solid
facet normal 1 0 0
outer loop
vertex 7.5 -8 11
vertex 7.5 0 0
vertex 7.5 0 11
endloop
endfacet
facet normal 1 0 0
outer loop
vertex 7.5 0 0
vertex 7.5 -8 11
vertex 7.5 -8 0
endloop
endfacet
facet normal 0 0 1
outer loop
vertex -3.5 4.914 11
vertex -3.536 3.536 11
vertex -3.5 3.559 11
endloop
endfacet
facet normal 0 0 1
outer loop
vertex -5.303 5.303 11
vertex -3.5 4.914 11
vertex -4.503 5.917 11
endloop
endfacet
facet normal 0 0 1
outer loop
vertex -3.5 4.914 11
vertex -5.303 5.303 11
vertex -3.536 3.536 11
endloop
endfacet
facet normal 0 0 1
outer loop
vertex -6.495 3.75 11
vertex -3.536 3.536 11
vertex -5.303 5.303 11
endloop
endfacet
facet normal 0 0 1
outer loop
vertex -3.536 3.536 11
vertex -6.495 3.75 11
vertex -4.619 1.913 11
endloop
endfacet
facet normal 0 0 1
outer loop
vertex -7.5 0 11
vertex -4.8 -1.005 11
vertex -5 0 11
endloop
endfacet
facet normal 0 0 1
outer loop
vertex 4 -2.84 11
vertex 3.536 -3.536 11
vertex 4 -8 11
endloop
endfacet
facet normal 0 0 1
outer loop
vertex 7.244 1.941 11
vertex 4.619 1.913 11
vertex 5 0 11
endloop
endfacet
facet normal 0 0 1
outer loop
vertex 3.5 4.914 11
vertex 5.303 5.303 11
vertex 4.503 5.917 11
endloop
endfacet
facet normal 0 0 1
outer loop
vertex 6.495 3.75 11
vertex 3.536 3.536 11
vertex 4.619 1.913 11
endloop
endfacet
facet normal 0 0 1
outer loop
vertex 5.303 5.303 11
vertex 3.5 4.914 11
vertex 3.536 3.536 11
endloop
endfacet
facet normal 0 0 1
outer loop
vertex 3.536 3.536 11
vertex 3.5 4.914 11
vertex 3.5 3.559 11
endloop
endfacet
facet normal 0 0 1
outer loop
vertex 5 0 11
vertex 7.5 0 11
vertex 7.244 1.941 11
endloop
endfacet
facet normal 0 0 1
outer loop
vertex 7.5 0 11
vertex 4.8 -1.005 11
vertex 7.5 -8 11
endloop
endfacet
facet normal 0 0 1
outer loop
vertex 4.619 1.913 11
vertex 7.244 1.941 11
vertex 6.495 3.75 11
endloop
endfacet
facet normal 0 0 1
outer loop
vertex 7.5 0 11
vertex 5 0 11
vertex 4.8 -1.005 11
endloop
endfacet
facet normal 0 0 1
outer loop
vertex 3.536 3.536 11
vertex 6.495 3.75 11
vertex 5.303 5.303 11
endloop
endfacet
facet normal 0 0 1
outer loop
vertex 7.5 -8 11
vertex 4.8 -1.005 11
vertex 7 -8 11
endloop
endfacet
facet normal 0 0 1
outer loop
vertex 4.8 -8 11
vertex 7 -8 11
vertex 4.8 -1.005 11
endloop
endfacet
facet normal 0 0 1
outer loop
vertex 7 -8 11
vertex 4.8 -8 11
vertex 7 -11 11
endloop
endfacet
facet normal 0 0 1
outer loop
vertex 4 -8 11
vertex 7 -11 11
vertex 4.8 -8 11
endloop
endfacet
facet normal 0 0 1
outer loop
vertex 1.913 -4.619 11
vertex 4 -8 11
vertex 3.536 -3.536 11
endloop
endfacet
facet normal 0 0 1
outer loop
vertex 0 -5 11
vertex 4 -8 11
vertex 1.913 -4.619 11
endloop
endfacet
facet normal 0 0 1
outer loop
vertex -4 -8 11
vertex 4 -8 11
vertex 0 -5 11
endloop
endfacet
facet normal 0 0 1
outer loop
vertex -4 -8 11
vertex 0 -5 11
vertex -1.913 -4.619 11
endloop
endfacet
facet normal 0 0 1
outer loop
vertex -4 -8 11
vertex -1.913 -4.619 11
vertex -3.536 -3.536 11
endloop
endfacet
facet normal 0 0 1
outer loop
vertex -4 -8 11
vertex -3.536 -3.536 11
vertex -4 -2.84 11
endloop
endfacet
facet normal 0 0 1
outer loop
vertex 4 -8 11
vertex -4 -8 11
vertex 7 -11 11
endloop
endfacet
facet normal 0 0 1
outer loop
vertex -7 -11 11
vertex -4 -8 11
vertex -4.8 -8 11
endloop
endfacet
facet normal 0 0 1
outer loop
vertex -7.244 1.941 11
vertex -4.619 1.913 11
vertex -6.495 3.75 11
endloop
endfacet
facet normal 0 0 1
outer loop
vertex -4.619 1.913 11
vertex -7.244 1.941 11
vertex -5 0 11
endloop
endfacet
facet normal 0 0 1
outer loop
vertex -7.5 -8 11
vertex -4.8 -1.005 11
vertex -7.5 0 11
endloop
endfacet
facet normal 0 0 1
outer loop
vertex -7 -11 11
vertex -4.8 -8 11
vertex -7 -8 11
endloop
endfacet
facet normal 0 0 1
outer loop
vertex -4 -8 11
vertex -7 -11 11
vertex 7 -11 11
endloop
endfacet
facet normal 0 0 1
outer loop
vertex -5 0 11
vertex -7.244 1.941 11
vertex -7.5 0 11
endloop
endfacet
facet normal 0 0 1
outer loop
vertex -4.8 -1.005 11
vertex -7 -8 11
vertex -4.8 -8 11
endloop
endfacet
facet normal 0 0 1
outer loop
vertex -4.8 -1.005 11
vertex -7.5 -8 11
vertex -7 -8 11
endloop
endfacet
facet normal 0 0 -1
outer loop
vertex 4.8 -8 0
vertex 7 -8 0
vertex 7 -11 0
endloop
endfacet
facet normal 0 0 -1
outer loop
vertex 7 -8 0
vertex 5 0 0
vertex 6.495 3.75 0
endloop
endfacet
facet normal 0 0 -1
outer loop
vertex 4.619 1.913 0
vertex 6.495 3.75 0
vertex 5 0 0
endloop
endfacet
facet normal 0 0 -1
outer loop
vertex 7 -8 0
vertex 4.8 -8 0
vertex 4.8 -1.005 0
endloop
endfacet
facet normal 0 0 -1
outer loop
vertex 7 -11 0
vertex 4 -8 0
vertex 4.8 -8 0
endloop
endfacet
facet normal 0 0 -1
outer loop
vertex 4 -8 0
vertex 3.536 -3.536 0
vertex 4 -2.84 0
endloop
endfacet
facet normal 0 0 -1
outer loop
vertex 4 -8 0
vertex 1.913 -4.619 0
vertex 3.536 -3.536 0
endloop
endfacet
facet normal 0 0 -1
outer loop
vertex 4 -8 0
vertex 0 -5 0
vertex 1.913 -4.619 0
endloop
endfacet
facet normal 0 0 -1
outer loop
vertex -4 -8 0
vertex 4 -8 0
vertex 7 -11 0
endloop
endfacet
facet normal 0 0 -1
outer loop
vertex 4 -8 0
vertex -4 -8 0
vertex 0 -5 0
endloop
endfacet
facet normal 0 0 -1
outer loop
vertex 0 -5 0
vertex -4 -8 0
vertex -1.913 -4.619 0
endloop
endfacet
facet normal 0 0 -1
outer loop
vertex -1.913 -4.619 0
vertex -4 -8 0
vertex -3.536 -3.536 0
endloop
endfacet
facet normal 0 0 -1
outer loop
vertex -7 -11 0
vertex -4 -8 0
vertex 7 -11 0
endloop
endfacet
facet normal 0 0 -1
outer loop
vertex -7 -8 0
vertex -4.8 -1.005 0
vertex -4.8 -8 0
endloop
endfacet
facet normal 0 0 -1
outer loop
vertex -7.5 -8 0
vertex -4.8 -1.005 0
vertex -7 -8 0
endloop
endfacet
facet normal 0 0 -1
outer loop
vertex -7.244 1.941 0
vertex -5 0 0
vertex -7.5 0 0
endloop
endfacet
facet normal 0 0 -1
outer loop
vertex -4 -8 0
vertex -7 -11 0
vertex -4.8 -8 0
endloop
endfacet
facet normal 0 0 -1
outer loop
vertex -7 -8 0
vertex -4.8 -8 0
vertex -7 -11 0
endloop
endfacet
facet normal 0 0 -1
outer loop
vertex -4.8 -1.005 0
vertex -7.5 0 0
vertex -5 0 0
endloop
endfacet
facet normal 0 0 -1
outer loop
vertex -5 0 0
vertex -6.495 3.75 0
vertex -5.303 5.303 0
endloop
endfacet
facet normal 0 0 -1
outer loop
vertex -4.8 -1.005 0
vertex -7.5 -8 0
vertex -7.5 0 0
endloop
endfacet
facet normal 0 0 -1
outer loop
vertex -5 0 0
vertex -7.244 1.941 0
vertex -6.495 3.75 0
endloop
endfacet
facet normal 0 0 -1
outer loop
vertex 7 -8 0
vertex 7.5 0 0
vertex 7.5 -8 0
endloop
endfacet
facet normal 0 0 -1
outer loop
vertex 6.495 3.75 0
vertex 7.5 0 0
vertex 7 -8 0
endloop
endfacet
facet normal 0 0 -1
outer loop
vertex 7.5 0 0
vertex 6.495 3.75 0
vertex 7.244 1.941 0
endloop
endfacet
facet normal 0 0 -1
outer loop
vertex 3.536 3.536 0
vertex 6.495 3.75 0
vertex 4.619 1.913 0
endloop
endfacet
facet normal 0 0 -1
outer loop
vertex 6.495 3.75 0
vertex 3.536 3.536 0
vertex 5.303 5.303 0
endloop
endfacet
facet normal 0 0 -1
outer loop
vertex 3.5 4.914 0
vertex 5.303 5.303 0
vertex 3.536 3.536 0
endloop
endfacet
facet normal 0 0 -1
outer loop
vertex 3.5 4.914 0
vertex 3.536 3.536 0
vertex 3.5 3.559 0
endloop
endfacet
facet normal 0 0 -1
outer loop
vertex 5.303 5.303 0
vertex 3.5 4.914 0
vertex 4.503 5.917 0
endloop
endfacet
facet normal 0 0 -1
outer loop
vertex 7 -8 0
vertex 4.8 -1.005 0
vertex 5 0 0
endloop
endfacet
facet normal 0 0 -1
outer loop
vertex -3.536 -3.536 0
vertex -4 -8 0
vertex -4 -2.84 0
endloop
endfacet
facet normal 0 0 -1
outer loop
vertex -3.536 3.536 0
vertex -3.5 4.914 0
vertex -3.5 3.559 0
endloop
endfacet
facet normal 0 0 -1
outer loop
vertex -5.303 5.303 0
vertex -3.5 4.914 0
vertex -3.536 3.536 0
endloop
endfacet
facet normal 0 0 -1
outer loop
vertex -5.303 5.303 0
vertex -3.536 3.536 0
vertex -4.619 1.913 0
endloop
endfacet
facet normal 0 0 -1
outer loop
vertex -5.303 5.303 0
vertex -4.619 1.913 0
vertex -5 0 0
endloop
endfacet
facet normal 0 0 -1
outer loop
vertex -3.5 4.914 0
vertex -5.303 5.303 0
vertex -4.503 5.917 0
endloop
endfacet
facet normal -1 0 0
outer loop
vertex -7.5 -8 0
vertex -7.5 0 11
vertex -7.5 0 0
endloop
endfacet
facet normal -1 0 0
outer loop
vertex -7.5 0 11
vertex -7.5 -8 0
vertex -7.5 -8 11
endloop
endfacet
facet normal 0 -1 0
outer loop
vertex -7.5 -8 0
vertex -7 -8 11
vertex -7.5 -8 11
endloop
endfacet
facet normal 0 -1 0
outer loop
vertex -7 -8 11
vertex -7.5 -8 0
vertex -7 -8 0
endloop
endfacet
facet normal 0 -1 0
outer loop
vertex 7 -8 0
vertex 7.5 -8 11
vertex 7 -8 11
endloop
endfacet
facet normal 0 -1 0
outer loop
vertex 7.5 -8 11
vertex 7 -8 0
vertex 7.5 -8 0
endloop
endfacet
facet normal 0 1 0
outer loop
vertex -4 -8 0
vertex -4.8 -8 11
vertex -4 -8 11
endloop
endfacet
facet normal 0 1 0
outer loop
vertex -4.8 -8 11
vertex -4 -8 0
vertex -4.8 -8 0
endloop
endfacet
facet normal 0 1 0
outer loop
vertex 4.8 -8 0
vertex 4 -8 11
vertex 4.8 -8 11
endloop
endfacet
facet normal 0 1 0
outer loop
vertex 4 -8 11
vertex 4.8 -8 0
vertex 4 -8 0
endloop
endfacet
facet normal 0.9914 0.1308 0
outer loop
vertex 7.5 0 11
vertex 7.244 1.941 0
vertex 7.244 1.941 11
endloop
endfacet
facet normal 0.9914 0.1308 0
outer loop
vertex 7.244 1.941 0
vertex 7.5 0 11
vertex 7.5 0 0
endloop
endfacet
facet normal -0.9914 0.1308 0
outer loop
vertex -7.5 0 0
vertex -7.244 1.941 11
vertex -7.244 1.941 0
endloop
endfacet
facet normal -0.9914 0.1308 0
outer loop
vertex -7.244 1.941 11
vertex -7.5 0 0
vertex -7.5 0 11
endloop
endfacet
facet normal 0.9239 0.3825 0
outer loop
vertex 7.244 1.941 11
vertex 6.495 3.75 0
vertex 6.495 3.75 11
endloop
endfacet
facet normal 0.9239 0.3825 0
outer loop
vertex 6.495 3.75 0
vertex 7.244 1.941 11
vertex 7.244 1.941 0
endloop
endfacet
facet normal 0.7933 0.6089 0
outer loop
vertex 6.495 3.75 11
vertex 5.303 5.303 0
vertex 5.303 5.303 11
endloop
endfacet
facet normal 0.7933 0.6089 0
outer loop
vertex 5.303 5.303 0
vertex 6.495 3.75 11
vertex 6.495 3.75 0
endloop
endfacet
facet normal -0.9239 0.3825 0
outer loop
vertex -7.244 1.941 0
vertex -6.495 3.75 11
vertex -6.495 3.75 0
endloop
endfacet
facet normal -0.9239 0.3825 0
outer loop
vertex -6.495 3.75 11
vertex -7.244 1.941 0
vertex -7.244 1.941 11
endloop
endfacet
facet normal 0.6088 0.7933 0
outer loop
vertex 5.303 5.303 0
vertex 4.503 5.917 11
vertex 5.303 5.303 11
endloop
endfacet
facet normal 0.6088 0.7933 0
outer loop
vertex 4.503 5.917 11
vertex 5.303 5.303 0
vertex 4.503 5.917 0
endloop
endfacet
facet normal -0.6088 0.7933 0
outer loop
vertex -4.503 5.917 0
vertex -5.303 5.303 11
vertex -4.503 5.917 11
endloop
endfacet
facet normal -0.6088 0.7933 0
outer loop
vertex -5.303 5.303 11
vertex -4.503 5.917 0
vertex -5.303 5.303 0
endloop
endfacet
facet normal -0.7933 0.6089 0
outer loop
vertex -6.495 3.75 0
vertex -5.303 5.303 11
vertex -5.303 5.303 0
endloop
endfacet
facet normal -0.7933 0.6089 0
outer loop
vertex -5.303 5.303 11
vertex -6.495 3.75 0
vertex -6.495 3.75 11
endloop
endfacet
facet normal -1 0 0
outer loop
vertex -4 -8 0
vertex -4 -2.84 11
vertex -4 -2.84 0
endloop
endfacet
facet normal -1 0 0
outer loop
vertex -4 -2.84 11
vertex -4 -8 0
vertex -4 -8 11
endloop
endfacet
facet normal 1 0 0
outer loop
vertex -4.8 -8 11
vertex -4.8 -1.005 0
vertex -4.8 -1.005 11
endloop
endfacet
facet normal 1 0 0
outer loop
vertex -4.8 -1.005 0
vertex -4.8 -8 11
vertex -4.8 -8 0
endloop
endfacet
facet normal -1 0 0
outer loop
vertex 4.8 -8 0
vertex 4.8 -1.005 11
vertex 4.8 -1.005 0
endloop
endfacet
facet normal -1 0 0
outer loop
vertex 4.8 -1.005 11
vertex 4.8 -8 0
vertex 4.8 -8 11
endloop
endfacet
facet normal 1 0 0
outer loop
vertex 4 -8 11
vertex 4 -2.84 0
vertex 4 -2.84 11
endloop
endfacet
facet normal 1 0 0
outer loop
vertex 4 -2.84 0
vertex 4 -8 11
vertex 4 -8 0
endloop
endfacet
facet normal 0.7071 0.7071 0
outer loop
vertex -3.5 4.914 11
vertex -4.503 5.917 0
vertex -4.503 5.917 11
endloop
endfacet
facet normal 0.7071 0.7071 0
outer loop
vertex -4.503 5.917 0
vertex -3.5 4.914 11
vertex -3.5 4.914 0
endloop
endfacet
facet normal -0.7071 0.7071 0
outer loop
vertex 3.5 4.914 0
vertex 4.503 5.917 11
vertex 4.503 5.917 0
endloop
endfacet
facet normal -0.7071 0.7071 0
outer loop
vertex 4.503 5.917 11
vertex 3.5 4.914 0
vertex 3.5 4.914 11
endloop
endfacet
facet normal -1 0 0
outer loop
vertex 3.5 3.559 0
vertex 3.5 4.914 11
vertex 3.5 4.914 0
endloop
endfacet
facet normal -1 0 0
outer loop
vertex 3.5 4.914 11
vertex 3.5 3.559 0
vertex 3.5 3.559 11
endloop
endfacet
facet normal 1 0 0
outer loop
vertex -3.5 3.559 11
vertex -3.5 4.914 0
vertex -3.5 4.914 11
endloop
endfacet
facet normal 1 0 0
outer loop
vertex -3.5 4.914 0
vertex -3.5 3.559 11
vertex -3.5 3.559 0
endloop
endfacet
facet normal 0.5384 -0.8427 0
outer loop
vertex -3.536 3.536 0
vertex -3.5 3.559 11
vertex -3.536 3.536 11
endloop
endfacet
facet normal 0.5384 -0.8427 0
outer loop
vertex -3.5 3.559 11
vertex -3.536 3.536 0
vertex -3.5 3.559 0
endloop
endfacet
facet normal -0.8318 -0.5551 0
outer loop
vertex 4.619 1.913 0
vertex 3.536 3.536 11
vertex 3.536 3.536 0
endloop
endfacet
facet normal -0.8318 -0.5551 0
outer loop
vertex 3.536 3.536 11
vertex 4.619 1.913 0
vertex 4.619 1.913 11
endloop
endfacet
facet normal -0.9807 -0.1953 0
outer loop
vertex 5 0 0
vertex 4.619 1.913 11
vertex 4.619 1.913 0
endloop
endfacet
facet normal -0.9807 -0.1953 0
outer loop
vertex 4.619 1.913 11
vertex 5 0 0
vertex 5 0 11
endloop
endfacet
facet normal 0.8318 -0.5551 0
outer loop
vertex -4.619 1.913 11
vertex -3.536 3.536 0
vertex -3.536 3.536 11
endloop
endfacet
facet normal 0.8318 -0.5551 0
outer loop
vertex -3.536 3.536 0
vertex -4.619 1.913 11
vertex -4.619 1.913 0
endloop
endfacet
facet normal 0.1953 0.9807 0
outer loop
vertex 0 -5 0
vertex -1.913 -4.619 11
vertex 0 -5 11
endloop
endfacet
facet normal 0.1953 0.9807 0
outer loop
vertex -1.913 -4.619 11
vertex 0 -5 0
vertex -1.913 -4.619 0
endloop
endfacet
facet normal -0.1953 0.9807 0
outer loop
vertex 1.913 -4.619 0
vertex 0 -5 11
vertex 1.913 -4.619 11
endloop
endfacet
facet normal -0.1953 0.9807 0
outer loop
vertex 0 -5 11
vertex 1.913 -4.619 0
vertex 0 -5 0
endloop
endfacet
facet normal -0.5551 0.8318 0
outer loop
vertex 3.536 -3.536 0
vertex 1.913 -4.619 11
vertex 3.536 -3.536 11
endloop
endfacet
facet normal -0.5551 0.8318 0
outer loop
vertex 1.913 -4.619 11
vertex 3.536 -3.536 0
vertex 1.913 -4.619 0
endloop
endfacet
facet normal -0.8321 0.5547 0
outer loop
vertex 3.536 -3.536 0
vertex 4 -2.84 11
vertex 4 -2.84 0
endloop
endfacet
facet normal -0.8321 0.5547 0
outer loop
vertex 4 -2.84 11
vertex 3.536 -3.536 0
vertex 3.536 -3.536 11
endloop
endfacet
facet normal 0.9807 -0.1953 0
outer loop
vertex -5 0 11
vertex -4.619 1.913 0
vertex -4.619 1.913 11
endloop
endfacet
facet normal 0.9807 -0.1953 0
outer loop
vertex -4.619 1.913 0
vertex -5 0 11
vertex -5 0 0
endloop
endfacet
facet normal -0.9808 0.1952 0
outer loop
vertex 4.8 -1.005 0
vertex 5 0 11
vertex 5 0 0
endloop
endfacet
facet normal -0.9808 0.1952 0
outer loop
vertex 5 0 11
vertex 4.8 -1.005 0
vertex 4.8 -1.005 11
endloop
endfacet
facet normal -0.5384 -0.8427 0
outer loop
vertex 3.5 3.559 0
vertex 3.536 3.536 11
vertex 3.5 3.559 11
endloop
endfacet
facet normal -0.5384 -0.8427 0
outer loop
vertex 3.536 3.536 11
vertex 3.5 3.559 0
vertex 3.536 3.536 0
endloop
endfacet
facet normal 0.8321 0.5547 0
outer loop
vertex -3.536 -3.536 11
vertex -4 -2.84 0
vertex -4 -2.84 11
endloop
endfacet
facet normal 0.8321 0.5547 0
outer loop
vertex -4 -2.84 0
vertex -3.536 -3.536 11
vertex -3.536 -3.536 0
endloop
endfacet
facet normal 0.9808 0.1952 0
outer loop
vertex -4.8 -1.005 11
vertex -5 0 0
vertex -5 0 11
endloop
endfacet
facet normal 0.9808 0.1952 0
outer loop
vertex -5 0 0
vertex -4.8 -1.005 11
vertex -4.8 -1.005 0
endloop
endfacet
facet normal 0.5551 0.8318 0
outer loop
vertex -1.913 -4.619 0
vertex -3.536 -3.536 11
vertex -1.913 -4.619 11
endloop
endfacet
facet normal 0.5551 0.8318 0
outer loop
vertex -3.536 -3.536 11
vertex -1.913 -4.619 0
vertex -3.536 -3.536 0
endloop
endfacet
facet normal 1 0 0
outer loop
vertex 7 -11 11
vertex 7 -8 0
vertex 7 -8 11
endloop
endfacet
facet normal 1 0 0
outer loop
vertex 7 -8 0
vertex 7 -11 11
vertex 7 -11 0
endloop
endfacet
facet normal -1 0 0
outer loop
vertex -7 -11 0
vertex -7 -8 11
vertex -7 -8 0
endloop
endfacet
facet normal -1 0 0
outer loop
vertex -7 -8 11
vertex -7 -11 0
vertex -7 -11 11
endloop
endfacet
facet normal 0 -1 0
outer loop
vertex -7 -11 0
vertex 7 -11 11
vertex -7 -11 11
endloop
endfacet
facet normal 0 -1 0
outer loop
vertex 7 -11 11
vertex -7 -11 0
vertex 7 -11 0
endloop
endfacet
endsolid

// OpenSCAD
// file: configuration-metric.scad
// PRUSA Mendel  
// Metric Configuration file
// GNU GPL v2
// Josef Průša
// josefprusa@me.com
// prusadjs.cz
// http://www.reprap.org/wiki/Prusa_Mendel
// http://github.com/prusajr/PrusaMendel

// CONFIGURATION FILE FOR METRIC VARIANT OF PRUSA MENDEL

// M8 rod diameter
m8_diameter = 8.4;

// M8 nut diameter diameter
// Used for $fn nut trick -> cylinder(h = 5, r=m8_nut_diameter, $fn=6, center=true);
m8_nut_diameter = 16.4;

// M4 rod/screw diameter
m4_diameter = 5;

// M4 nut diameter
// Used for $fn nut trick -> cylinder(h = 5, r=m4_nut_diameter, $fn=6, center=true);
m4_nut_diameter = 9;

// M3 rod/screw diameter
m3_diameter = 4.4;

// M3 nut diameter diameter
// Used for $fn nut trick -> cylinder(h = 5, r=m3_nut_diameter, $fn=6, center=true);
m3_nut_diameter = 7;

// Bushing holders diameter
bushing_diameter = 11;

//Motor shaft diameter
motor_shaft=5;

//Bushings
	//Size of rod on which it will slide
	bushing_rodsize = 8;
	
	//Size of whole bushings (diameter because the core is cylinder)
	bushing_outerDiameter = 16;
	
	//How long they are going to be
	bushing_lenght = 11;
	
	// TYPE Can generate three versions
	// 1 - regular old ones
	// 2 - helical ones
	// 3 - holders for brass or any other bought bushings
	bushing_type = 2;
// file: configuration.scad
// PRUSA Mendel  
// Configuration file
// GNU GPL v2
// Josef Průša
// josefprusa@me.com
// prusadjs.cz
// http://www.reprap.org/wiki/Prusa_Mendel
// http://github.com/prusajr/PrusaMendel

// PLESE SELECT ONE OF THE CONFIGURATION FILES
// BY UN-COMMENTING IT

// METRIC VERSION
include <configuration-metric.scad>

// IMPERIAL VERSION (TODO, just place holder)
// Spacexula will do it ;-)
// include <configuration-imperial.scad>

// MINI-HUXLEY VERSION (TODO, just place holder)
// include <configuration-huxley.scad>

// MEGA VERSION (TODO, just place holder)
// include <configuration-mega.scad>
// main file
// PRUSA Mendel  
// Bushings
// GNU GPL v2
// Josef Průša
// josefprusa@me.com
// prusadjs.cz
// http://www.reprap.org/wiki/Prusa_Mendel
// http://github.com/prusajr/PrusaMendel

include <configuration.scad>

/**
 * @name Bushing
 * @category Printed
 * @link bushing
 */ 

rodsize = bushing_rodsize;
outerDiameter = bushing_outerDiameter;
lenght = bushing_lenght;
type = bushing_type;


module bushing(stiff, lenght=11){
	difference(){
		union(){
			translate(v=[-7.5,-8,0])cube(size = [15,8,lenght]);
			cylinder(h = lenght, r=7.5);
		}
	//cutout inside
	//Opening
	rotate(a=[0,0,45]) translate(v=[1,1,-1]) cube(size = [16,16,lenght+2]);
	//Cutouts to make it more bendy
	if(stiff){
		translate(v=[-4.8,-6,-1]) cube(size = [0.8,6,lenght+2]);
		translate(v=[4,-6,-1]) cube(size = [0.8,6,lenght+2]);
	}else{
		translate(v=[-4.8,-8,-1]) cube(size = [0.8,8,lenght+2]);
		translate(v=[4,-8,-1]) cube(size = [0.8,8,lenght+2]);
	}
	translate(v=[0,5,(lenght+2)/2]) cube(size = [7,8,lenght+2], center=true);
	translate(v=[0,0,-1]) cylinder(h = lenght+2, r=5);
	}
}
bushing(false, 11);
translate(v=[-7,-11,0])cube(size = [14,3,11]);
